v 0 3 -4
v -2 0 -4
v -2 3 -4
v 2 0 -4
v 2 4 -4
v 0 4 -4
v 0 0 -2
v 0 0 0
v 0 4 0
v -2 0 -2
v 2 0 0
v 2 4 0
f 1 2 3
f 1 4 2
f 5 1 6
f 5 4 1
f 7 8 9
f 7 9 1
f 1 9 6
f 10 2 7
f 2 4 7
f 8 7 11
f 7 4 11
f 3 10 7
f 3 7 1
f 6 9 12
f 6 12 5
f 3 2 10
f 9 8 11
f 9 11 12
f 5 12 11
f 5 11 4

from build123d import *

# Parameters (mm, degrees)
SKETCH1_W           = 4
SKETCH1_H           = 4
BOSS_EXTRUDE1_DEPTH = 2
SKETCH2_W           = 2
SKETCH2_H           = 3
BOSS_EXTRUDE2_DEPTH = 2
CUT_EXTRUDE1_DEPTH  = 2


with BuildPart() as part:
    # Sketch1 → Boss-Extrude1 (new body)
    with BuildSketch(Plane(origin=(0, 0, 0), x_dir=(0, 0, -1), z_dir=(1, 0, 0))):
        with Locations((2, 2)):
            Rectangle(SKETCH1_W, SKETCH1_H)
    extrude(amount=BOSS_EXTRUDE1_DEPTH)

    # Sketch2 → Boss-Extrude2 (add)
    with BuildSketch(Plane.ZY):
        with Locations((-3, 1.5)):
            Rectangle(SKETCH2_W, SKETCH2_H)
    extrude(amount=BOSS_EXTRUDE2_DEPTH)

    # Sketch3 → Cut-Extrude1 (cut)
    with BuildSketch(Plane.ZY.offset(2)):
        Polygon((-4, 3), (-2, 3), (-2, 0), align=None)
    extrude(amount=-CUT_EXTRUDE1_DEPTH, mode=Mode.SUBTRACT)


solid = part.part
